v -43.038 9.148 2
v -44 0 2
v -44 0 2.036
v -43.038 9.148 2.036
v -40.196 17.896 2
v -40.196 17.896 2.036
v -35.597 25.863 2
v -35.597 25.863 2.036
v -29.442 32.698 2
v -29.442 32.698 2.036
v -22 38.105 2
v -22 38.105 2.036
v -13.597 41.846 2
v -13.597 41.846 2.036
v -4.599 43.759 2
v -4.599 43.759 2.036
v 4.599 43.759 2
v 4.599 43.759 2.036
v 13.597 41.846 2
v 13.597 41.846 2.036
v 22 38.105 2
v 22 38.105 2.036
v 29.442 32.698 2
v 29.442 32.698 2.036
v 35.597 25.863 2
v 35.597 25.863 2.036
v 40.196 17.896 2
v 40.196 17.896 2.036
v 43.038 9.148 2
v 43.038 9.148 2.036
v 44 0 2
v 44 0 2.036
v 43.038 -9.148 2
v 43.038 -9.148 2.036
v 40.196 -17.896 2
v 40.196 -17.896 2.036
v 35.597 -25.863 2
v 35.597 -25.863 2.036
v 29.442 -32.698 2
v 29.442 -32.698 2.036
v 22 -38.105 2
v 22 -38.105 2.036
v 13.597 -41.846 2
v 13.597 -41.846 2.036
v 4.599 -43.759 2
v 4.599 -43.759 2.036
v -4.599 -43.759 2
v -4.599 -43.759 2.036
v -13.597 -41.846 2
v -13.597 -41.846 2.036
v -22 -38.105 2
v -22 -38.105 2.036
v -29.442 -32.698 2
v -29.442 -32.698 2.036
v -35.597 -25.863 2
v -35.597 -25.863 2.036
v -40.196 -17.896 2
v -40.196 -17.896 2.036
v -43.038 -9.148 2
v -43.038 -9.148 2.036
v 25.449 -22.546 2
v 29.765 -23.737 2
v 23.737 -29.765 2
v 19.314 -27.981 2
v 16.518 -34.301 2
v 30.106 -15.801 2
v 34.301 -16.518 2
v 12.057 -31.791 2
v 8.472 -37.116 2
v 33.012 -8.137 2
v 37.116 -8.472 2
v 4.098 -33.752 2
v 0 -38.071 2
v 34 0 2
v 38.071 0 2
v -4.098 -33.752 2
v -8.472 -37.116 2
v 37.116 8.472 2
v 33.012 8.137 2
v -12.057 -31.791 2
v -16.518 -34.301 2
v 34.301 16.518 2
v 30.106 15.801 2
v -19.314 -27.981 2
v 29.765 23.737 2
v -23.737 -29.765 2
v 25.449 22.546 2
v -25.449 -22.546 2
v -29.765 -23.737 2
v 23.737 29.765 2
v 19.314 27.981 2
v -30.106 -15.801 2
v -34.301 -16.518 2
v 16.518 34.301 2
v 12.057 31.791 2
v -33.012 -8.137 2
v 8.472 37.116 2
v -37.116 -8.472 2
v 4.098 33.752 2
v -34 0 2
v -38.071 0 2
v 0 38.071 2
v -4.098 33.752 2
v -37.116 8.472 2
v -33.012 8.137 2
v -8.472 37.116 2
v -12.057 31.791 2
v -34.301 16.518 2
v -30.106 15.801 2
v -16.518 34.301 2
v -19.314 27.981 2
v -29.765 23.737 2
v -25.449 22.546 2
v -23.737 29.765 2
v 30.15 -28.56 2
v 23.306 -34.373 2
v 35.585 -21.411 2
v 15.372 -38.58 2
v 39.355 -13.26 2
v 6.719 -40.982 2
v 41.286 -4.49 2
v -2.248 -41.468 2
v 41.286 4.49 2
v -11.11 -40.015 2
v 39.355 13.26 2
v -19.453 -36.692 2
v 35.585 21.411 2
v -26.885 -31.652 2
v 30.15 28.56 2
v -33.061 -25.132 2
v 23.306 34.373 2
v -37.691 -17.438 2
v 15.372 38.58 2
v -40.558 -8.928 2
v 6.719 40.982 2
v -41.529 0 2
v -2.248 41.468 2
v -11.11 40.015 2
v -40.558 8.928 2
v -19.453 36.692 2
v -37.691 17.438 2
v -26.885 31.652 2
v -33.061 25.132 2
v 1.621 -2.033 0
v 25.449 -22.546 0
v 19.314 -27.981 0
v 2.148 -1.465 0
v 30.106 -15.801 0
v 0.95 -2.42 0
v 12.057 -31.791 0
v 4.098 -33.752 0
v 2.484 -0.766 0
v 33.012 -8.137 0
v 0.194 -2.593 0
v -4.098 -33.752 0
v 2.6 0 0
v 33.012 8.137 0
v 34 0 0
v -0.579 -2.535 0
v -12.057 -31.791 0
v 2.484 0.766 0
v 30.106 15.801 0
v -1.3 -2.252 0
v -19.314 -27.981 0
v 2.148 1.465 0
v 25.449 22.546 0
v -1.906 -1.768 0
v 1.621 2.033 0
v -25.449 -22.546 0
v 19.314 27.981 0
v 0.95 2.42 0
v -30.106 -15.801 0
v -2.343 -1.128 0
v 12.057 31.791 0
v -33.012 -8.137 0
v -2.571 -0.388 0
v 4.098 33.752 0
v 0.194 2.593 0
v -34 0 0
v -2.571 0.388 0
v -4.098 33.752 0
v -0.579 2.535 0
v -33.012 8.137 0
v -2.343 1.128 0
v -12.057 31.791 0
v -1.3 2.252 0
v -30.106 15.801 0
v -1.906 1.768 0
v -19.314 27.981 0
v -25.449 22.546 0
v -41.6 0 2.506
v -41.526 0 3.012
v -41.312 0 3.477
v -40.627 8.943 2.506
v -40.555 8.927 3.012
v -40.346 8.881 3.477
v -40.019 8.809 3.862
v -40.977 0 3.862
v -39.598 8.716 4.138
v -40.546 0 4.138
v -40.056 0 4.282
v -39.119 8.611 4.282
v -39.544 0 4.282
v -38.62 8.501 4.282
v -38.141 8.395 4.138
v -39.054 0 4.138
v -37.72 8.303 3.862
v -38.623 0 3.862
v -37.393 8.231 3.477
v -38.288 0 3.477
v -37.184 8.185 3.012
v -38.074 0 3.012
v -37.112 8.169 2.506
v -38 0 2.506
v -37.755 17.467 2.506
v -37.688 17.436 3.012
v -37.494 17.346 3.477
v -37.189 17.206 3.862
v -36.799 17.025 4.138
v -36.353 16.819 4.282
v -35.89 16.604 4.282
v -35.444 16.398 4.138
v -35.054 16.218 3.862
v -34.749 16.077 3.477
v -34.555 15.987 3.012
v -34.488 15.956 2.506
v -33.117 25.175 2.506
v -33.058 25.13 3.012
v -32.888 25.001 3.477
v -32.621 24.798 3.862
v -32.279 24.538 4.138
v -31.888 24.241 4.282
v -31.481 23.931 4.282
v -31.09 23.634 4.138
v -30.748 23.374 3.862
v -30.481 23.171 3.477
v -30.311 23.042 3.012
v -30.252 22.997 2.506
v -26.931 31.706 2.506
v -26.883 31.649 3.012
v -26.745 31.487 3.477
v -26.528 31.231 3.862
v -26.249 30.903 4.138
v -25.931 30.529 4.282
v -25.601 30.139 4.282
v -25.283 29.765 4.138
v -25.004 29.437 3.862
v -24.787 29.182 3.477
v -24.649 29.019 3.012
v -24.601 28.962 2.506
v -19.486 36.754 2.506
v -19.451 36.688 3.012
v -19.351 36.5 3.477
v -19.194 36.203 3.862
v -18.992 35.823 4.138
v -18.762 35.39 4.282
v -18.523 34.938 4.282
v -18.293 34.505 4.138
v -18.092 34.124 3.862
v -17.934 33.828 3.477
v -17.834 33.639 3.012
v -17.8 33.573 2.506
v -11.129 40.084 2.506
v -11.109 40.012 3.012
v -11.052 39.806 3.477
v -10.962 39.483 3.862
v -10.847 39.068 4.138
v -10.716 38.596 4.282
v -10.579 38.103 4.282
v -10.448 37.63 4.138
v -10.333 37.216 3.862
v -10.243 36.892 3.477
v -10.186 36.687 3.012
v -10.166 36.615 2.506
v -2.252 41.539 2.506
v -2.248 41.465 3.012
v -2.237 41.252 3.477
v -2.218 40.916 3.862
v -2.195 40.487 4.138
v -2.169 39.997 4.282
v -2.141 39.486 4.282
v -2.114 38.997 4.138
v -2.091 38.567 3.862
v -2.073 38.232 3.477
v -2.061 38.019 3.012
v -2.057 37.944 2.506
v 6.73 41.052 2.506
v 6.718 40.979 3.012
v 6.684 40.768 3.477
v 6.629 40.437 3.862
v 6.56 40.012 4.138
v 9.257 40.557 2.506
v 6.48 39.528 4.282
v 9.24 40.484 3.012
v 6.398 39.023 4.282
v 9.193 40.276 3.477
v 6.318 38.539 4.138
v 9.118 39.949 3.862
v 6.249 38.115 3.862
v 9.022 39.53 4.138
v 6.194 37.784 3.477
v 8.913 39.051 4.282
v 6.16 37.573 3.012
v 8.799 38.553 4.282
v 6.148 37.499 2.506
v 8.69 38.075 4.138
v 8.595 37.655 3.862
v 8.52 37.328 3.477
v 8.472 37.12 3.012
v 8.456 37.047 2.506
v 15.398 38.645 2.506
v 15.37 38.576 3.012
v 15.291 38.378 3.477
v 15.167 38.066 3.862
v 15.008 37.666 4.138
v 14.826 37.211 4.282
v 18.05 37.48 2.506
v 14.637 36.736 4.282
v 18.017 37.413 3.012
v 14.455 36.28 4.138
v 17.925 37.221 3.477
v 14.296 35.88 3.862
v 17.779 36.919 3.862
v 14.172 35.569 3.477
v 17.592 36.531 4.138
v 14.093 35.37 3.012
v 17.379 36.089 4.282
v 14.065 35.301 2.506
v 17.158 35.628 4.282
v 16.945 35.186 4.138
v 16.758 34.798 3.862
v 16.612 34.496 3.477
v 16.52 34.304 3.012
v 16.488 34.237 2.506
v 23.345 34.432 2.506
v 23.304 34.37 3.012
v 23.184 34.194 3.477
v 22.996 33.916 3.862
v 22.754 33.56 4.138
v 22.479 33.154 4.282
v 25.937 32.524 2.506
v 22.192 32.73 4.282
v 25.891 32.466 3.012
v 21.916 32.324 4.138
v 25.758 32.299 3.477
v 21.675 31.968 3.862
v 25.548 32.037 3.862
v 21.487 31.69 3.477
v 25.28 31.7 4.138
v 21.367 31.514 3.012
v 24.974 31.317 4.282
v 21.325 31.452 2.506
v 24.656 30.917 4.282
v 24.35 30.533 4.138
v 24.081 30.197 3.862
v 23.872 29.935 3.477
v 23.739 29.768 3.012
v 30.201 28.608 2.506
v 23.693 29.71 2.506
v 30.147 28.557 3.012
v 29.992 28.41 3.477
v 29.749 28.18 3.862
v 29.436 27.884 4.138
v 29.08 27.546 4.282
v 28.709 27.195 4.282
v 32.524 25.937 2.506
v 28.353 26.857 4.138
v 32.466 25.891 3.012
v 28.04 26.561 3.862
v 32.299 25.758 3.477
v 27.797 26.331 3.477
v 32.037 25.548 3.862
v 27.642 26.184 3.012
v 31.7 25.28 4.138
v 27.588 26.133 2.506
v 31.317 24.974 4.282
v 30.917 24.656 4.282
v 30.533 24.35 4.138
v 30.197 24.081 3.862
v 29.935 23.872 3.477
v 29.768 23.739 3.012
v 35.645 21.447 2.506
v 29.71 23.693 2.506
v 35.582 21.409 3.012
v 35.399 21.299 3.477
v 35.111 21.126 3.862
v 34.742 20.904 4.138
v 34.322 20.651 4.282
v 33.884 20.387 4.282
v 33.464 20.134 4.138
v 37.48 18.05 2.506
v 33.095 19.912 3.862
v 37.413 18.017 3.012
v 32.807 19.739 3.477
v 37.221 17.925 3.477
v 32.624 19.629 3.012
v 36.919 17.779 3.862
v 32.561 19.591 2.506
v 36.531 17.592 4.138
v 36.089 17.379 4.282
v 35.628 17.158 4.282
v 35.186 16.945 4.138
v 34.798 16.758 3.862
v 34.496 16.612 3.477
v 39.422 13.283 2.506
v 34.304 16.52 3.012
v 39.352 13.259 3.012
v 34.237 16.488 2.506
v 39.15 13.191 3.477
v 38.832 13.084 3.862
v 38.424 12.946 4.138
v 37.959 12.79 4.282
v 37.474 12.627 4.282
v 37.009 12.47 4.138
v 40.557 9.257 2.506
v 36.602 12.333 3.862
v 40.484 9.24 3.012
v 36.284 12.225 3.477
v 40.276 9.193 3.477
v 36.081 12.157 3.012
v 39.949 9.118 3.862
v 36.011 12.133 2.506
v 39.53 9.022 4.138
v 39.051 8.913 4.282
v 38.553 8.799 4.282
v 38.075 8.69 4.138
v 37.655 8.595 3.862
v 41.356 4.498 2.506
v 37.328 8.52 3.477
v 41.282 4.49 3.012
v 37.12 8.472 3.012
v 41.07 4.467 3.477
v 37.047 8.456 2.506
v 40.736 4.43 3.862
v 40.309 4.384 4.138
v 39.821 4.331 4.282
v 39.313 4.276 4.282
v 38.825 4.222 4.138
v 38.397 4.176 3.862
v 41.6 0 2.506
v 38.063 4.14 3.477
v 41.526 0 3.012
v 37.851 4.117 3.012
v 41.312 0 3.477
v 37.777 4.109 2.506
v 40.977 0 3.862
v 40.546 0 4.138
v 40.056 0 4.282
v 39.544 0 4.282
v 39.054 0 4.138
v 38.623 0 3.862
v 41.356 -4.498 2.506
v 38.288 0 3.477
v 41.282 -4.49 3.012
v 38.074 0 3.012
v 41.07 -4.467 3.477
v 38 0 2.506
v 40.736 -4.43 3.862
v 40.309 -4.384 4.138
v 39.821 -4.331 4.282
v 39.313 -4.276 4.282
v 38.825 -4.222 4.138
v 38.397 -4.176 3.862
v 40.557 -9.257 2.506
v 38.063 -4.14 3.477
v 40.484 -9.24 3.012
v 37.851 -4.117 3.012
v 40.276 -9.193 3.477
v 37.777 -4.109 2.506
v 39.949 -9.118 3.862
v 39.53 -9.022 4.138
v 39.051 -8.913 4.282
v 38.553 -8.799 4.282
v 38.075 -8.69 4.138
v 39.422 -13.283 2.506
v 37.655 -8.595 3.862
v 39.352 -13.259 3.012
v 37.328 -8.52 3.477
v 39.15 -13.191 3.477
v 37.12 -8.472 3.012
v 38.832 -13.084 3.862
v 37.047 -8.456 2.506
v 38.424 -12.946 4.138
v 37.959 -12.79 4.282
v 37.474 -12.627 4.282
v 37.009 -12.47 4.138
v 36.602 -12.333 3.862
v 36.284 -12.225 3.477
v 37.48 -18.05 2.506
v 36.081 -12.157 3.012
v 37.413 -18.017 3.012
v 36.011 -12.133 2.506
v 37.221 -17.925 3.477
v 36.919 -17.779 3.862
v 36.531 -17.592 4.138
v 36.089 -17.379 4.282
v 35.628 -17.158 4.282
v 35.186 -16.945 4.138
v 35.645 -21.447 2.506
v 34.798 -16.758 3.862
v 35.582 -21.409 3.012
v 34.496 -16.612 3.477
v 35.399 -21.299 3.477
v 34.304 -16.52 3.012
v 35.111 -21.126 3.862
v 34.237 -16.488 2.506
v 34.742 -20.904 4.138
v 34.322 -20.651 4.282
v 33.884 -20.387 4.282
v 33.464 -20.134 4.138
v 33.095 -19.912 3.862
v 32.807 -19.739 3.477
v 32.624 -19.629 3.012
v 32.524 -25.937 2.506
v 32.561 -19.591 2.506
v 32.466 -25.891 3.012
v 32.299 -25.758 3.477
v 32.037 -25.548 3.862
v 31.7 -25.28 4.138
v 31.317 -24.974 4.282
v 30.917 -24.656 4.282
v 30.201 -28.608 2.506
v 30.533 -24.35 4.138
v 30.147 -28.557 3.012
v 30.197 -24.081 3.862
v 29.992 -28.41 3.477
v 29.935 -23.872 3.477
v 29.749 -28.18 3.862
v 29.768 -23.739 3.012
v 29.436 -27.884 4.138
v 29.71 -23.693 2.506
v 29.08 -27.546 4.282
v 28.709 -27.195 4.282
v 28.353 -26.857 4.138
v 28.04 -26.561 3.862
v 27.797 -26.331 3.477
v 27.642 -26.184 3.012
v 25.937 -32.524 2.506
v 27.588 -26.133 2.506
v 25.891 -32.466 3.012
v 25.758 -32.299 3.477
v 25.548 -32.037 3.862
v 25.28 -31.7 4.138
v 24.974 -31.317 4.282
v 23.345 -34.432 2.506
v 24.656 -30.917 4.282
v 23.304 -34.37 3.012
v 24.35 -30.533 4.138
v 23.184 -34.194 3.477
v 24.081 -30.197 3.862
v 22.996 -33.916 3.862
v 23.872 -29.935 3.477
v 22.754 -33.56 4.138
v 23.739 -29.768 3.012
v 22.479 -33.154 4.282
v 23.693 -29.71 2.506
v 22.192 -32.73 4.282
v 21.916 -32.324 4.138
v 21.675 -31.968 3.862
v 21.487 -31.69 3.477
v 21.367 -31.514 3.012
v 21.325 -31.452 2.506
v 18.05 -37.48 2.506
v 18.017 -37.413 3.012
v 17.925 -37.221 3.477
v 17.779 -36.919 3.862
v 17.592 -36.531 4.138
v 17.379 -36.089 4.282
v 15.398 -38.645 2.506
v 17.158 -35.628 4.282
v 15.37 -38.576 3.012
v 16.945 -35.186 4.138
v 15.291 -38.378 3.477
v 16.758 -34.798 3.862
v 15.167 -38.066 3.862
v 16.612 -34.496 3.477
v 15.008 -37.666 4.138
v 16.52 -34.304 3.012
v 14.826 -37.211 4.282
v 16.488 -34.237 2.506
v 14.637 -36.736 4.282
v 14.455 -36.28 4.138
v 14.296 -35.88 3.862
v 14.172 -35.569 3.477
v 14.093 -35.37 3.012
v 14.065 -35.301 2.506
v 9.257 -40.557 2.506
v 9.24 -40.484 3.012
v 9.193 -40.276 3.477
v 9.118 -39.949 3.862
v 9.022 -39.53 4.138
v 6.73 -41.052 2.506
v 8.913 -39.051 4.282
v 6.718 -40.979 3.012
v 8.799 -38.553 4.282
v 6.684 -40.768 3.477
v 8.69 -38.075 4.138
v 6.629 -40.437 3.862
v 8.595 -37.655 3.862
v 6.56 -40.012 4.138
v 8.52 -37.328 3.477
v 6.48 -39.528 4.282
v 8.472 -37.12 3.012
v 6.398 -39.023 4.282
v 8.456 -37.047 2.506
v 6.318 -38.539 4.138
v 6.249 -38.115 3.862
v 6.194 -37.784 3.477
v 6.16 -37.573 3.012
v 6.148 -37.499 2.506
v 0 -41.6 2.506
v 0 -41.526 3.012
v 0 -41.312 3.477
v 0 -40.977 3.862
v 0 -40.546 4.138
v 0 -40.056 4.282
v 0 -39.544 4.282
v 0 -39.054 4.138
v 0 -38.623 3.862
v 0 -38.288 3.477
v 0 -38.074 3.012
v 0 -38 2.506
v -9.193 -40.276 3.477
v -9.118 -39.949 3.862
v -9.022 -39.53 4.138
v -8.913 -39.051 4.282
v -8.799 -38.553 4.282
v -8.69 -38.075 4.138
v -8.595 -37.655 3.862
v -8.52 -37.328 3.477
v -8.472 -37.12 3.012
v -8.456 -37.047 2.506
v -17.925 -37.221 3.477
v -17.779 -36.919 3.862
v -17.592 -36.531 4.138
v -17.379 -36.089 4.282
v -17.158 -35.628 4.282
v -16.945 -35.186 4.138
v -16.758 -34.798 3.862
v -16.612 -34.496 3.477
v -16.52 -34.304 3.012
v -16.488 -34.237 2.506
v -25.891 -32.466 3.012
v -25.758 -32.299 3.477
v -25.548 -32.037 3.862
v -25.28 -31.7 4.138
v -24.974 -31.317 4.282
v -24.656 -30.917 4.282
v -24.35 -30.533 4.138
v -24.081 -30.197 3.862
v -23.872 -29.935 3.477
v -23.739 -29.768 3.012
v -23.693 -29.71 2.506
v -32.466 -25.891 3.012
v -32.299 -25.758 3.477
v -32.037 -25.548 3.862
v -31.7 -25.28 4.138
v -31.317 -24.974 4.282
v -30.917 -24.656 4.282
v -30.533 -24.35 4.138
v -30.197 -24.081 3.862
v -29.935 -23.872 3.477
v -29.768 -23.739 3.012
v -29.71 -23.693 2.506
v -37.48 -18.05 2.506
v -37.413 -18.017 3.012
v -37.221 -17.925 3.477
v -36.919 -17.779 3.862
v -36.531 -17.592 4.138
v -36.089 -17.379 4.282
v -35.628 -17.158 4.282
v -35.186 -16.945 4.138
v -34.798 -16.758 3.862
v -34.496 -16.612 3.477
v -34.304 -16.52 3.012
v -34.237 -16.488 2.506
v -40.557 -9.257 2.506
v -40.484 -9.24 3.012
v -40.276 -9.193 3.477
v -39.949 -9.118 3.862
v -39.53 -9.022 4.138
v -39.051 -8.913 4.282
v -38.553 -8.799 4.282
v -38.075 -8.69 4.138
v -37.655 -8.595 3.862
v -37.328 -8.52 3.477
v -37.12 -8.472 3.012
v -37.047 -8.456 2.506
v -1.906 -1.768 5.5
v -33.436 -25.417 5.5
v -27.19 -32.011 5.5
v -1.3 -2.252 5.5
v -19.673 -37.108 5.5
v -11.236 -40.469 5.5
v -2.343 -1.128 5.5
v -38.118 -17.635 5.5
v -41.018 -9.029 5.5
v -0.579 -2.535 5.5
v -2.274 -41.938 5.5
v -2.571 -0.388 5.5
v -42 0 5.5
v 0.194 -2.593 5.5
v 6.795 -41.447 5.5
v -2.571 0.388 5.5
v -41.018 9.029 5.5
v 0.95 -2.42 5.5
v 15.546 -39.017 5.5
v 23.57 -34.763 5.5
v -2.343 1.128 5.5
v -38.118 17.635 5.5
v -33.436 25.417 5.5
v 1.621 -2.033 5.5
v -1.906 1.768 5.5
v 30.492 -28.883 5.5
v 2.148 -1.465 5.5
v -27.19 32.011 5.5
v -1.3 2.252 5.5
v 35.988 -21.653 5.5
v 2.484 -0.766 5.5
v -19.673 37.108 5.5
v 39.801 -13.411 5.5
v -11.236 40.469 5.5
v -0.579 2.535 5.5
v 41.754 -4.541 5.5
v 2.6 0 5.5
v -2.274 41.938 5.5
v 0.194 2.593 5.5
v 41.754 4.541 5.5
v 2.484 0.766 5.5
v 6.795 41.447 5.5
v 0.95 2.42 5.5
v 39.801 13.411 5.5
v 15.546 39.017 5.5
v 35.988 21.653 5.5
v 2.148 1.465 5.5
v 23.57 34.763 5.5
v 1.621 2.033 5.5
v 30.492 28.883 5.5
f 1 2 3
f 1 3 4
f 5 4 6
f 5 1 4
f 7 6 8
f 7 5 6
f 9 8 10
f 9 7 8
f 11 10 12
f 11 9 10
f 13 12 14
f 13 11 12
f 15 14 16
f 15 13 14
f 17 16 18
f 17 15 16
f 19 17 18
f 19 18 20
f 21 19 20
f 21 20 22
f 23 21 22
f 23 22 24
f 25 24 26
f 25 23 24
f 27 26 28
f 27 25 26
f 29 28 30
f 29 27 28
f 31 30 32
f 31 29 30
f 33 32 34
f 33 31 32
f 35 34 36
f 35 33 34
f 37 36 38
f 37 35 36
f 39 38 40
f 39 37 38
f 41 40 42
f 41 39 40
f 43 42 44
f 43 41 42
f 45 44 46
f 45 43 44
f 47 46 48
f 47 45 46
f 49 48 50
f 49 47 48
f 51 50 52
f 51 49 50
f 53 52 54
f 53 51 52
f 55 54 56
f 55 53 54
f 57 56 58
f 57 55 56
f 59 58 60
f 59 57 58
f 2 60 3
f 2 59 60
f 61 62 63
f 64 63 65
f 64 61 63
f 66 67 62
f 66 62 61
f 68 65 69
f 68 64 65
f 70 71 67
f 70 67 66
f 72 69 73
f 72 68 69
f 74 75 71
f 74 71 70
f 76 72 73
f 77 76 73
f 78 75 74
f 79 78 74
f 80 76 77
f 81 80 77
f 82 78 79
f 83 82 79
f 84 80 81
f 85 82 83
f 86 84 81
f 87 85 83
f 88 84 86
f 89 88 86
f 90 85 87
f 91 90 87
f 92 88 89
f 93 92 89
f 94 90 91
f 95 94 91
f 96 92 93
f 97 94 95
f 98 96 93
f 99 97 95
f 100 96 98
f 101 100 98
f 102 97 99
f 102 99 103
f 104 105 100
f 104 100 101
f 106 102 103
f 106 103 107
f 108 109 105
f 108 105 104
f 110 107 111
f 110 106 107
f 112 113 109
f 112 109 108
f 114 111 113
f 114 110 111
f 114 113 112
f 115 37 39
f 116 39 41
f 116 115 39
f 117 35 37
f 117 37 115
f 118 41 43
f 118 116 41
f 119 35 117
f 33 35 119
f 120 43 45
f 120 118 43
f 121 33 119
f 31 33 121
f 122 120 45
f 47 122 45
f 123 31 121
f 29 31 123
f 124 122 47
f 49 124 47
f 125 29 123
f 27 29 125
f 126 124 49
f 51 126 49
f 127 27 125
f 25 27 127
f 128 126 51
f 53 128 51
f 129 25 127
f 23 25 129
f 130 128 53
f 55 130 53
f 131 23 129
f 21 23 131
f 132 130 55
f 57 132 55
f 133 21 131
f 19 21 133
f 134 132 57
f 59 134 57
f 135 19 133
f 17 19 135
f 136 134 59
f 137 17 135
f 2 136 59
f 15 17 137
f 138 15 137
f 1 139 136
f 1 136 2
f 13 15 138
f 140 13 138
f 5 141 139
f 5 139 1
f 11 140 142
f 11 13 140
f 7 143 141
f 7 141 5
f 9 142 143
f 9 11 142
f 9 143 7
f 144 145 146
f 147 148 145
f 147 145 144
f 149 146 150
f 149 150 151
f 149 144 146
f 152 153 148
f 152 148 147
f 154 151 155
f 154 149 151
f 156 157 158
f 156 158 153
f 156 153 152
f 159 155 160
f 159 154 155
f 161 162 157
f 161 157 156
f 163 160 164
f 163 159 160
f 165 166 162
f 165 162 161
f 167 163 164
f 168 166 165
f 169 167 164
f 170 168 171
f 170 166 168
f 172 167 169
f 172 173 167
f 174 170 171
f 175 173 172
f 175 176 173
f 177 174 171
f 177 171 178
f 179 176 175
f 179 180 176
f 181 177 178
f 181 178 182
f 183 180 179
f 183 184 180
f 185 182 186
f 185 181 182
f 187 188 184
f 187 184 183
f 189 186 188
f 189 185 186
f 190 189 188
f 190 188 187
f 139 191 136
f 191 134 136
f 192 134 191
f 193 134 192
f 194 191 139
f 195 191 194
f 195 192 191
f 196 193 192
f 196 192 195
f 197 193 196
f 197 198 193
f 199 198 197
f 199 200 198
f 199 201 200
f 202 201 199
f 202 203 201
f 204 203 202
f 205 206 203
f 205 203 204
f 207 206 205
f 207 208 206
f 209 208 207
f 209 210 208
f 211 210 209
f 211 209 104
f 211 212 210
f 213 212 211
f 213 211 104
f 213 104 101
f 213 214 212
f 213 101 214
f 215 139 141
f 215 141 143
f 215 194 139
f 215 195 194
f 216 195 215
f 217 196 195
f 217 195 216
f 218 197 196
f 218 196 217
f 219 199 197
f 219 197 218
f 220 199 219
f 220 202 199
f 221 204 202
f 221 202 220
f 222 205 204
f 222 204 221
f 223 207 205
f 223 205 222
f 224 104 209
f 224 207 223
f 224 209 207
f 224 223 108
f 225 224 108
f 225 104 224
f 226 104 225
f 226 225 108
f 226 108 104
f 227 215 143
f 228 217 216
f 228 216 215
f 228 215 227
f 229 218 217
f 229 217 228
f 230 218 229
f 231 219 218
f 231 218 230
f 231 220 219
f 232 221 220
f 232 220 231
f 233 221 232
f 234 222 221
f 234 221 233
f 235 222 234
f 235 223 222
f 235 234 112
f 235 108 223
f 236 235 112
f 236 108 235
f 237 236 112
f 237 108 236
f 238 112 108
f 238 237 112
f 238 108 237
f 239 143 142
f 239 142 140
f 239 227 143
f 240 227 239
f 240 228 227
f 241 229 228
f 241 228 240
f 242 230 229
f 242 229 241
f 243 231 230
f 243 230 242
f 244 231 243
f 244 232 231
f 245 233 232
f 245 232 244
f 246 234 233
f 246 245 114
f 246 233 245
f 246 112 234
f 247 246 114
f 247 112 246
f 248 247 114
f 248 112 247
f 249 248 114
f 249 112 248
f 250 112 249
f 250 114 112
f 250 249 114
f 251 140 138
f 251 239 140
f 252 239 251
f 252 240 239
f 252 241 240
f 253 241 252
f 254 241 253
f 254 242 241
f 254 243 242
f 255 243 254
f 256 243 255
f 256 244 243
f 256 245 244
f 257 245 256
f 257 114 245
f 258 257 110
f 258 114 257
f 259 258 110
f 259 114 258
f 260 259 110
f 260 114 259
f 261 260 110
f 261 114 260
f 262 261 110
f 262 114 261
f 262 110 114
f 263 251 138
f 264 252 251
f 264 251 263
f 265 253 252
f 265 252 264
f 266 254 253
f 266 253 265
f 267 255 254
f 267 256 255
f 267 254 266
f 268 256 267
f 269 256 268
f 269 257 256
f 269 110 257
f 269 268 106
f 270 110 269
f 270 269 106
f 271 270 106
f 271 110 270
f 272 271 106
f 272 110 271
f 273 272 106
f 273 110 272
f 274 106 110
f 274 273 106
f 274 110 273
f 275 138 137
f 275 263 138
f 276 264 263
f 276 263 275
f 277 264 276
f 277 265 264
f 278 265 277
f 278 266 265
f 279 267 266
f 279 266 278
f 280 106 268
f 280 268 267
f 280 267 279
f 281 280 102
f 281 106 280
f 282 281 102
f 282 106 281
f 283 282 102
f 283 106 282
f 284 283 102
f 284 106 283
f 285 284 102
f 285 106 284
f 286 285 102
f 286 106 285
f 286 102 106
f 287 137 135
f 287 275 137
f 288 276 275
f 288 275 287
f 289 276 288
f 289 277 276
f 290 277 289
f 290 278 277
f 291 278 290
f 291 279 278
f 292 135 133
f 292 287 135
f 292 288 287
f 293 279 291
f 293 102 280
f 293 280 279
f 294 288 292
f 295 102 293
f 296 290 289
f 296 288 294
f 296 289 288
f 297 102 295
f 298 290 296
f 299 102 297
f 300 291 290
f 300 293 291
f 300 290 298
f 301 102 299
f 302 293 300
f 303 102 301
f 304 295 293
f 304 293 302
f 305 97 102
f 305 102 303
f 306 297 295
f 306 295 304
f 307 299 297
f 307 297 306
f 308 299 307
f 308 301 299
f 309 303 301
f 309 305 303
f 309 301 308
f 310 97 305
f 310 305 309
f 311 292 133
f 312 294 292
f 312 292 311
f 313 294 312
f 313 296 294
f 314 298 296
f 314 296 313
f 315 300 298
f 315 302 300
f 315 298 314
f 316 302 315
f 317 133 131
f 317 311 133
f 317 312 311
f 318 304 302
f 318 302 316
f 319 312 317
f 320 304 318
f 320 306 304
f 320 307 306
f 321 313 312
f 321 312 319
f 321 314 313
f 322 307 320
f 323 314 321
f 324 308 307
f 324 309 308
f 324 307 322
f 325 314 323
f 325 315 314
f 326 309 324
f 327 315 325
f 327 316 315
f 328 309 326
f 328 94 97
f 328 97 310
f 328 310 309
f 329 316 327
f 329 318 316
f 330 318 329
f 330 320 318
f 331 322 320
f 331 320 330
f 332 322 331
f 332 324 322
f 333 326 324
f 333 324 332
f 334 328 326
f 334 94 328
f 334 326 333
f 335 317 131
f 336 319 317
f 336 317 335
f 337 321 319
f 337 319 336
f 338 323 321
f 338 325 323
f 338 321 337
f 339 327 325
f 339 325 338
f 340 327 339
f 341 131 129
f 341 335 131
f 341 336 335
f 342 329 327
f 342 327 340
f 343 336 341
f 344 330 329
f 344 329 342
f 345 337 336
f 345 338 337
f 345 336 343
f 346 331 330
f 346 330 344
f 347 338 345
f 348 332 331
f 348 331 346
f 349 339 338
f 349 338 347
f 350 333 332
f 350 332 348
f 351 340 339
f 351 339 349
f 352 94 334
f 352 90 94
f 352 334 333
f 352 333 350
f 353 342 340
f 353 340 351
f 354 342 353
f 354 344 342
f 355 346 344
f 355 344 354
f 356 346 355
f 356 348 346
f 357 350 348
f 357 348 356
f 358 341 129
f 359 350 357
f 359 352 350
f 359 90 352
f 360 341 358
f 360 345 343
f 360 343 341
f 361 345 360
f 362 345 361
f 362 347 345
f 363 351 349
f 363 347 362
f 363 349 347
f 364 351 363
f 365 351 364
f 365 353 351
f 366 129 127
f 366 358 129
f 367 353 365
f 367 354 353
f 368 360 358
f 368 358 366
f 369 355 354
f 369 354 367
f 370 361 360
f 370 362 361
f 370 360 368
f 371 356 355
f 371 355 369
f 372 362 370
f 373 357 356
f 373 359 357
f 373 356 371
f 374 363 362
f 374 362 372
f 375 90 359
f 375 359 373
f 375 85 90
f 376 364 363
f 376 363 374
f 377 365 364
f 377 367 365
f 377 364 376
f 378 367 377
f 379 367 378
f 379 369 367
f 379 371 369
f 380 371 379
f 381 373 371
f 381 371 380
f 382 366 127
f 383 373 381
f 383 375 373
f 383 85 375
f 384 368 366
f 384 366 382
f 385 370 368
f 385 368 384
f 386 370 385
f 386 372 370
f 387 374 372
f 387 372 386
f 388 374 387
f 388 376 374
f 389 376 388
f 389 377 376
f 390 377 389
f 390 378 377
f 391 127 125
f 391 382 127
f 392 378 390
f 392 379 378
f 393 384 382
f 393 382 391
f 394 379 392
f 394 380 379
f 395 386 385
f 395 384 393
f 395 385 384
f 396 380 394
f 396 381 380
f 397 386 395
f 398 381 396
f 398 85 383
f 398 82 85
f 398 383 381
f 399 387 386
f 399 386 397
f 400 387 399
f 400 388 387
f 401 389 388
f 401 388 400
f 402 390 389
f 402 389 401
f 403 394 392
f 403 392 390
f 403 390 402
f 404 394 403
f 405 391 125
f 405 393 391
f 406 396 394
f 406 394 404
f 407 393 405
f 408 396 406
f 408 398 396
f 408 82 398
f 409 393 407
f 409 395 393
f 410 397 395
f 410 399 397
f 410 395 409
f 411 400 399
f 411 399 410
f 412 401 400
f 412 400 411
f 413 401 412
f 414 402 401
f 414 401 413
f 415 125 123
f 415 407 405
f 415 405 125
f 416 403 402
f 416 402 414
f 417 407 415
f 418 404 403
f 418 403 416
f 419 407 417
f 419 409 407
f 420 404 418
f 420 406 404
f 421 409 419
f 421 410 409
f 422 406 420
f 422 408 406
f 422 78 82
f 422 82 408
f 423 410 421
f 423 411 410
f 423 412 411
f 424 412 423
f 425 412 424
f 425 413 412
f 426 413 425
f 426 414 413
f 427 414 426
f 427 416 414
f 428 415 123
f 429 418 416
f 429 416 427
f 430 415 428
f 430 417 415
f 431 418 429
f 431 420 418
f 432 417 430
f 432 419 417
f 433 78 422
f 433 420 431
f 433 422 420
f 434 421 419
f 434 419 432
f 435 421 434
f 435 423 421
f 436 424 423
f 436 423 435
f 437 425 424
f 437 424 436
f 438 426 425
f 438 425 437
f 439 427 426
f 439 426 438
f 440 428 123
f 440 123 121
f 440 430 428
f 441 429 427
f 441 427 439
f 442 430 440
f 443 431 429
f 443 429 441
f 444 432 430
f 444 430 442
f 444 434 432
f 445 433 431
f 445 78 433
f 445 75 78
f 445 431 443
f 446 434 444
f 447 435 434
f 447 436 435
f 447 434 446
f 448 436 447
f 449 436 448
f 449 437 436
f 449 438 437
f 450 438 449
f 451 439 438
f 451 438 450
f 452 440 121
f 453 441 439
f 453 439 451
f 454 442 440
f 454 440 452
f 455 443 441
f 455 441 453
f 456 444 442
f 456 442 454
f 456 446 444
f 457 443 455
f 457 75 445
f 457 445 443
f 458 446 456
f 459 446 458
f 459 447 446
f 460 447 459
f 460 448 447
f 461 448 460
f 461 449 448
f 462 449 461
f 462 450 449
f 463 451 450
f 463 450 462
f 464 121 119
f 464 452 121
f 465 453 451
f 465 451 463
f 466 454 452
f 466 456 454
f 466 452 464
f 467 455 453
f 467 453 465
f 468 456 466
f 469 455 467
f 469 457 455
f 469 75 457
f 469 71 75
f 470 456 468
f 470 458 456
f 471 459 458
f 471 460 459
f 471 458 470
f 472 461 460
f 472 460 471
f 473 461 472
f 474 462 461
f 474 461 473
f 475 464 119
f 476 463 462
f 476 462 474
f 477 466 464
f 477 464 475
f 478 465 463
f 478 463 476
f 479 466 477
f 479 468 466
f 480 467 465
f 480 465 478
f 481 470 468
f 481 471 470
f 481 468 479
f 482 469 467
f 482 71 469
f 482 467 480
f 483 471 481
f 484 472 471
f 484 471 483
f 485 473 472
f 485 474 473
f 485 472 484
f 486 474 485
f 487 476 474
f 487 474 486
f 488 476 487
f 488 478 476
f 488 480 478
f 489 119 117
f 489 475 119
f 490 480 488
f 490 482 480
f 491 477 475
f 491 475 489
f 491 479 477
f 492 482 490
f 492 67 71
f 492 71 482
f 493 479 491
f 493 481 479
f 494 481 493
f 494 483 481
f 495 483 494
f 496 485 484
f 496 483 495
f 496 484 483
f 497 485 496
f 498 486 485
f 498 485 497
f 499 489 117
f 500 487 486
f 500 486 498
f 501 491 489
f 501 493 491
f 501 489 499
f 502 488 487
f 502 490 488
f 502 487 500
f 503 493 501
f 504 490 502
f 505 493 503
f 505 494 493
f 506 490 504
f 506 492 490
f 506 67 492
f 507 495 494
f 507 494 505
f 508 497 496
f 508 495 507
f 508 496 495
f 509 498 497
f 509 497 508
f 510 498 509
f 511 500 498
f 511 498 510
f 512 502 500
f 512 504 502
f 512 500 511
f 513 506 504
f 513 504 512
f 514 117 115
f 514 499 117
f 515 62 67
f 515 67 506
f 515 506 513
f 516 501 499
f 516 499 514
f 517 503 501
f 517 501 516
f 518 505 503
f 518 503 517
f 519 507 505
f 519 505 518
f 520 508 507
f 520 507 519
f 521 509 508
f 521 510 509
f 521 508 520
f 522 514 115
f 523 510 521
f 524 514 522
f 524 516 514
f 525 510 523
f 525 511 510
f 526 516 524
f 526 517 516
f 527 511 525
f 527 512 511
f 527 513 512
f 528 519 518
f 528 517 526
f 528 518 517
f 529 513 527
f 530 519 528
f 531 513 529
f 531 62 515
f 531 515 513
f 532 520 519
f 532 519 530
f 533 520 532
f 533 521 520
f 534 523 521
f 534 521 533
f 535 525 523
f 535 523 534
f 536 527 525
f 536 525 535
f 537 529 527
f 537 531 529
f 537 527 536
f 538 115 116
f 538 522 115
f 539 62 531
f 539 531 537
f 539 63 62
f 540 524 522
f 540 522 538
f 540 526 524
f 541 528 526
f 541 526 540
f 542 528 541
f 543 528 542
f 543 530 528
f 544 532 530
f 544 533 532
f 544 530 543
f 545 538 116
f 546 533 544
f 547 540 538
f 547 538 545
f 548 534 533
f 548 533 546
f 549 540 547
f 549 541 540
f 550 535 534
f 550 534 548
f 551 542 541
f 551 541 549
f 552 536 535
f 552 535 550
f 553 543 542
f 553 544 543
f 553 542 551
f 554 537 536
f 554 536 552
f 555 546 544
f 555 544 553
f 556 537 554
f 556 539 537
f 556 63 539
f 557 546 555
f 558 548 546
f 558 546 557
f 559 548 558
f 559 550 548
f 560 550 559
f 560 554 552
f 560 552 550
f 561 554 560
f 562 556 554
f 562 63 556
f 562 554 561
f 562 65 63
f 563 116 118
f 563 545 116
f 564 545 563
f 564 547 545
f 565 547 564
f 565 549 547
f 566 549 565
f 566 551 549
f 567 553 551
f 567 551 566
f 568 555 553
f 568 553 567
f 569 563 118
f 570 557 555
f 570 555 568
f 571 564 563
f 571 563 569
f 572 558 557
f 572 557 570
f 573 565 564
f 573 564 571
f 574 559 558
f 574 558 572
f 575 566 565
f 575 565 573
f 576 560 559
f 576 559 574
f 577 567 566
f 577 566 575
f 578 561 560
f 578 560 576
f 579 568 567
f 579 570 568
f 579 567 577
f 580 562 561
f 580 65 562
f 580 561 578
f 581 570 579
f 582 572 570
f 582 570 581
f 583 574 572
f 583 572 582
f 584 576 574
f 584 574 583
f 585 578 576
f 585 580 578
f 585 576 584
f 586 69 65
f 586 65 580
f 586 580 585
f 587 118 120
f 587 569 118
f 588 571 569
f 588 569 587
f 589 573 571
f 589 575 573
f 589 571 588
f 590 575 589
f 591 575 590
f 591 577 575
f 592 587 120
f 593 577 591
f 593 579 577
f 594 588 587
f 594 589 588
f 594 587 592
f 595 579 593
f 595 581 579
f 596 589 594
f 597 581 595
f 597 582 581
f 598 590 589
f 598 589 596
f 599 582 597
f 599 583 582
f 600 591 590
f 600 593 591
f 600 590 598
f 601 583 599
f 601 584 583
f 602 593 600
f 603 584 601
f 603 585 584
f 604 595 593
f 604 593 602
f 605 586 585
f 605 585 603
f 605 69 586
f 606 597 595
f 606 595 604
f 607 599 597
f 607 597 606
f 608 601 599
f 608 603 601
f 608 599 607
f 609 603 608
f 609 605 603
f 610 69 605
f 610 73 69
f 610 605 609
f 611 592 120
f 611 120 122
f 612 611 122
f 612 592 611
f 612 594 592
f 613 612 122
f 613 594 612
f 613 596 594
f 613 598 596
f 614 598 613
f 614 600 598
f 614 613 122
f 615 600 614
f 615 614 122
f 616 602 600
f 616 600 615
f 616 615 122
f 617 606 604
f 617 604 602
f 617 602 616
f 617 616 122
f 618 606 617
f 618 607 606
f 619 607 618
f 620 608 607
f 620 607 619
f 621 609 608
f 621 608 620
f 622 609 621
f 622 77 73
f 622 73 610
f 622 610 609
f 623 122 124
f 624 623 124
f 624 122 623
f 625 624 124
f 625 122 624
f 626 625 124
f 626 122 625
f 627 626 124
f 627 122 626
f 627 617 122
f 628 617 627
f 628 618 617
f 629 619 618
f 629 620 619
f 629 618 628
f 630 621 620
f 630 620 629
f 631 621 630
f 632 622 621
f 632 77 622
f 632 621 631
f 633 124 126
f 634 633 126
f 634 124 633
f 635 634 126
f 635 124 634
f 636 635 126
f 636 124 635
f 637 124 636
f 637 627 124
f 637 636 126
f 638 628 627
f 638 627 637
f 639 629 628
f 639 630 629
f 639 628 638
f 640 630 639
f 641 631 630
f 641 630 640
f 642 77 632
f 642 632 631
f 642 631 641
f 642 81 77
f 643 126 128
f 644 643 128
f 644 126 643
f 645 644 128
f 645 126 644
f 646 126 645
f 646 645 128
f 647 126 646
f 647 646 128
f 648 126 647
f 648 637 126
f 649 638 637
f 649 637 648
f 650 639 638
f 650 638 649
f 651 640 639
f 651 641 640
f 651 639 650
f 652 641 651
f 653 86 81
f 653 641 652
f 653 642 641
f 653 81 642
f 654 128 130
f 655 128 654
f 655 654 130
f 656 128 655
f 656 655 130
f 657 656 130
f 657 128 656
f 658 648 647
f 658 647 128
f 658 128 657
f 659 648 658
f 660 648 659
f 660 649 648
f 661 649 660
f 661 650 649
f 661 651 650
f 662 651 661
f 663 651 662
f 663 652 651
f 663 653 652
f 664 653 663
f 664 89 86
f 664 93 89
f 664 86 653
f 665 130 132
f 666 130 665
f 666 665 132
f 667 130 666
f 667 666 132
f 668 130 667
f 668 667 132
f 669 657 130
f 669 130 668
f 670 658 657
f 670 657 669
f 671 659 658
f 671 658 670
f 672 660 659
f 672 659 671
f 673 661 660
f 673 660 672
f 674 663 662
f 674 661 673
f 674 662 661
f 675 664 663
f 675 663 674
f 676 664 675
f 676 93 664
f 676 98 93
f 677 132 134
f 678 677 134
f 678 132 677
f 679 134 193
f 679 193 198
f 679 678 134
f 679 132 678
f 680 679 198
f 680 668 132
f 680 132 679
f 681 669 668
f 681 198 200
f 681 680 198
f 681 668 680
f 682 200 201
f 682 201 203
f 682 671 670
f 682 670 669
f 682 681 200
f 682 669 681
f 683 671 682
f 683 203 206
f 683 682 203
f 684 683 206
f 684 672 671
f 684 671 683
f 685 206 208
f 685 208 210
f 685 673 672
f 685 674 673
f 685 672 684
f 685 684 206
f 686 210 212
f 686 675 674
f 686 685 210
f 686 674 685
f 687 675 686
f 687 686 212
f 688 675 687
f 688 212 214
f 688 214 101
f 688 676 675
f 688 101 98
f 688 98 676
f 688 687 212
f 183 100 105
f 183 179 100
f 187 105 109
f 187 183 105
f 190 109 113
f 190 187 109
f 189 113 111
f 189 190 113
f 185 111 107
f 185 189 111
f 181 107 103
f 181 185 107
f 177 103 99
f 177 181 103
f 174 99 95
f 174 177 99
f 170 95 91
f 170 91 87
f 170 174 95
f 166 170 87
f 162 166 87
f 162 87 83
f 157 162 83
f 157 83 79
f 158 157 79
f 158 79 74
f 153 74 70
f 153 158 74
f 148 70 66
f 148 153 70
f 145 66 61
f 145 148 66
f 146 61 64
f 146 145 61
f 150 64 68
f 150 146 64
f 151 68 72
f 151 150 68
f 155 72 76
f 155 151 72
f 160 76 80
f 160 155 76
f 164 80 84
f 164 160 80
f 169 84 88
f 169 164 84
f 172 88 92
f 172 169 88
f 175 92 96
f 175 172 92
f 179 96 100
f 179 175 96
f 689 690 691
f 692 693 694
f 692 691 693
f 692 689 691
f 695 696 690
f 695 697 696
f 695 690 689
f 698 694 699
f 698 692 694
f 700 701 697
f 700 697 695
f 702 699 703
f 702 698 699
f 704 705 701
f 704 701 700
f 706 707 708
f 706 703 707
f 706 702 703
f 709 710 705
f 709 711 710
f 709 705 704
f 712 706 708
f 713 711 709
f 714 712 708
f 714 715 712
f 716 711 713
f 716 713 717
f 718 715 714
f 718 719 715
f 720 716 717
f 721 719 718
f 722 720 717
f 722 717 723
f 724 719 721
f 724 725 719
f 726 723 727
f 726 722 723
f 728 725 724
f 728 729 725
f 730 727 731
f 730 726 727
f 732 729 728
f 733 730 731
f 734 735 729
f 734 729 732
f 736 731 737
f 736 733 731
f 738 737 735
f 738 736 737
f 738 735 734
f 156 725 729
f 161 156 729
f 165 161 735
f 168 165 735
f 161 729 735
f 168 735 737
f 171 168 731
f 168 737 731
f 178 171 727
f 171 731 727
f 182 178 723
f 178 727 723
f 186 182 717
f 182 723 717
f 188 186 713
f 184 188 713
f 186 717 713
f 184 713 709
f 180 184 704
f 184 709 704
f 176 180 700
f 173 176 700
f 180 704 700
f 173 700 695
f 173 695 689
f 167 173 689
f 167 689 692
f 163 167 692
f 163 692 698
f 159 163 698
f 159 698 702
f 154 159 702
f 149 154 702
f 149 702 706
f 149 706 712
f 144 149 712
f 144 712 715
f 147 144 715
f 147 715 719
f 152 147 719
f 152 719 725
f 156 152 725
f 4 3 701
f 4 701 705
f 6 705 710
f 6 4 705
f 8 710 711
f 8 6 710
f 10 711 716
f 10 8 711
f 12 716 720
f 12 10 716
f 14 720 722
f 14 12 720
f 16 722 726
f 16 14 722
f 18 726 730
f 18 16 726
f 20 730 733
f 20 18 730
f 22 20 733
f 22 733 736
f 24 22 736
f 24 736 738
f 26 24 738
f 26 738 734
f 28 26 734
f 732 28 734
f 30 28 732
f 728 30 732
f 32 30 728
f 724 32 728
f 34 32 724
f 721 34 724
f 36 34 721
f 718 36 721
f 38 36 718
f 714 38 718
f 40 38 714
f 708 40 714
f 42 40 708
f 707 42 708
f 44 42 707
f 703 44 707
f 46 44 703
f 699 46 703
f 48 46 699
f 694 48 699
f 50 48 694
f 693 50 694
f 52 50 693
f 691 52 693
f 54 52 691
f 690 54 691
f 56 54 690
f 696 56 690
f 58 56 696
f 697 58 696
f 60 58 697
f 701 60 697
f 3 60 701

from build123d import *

# Parameters (mm, degrees)
F2_R     = 2.6
F3_DEPTH = 5.501
F4_SIZE2 = 3.464102
F4_SIZE  = 2


with BuildPart() as f1:
    # F0 (on Front) → F1 (revolve)
    with BuildSketch(Plane.XZ):
        with BuildLine():
            Line((-34, 0), (0, 0))
            Line((0, 0), (0, 5.5))
            Line((0, 5.5), (-44, 5.5))
            Line((-44, 5.5), (-44, 2))
            Line((-44, 2), (-41.529162, 2))
            ThreePointArc((-41.529162, 2), (-39.8, 4.3), (-38.070838, 2))
            Line((-38.070838, 2), (-34, 2))
            Line((-34, 2), (-34, 0))
        make_face()
    revolve(axis=Axis((0, 0, 2.75), (0, 0, -1)))

    # F2 (on face) → F3 (cut, through all)
    with BuildSketch(Plane.XY.offset(5.5)):
        Circle(F2_R)
    extrude(amount=-F3_DEPTH, mode=Mode.SUBTRACT)

    # F4
    f4_edges = [f1.edges().sort_by_distance(p)[0] for p in [
        (44, 0, 5.5),
    ]]
    chamfer(f4_edges, length=F4_SIZE, length2=F4_SIZE2)


solid = f1.part
